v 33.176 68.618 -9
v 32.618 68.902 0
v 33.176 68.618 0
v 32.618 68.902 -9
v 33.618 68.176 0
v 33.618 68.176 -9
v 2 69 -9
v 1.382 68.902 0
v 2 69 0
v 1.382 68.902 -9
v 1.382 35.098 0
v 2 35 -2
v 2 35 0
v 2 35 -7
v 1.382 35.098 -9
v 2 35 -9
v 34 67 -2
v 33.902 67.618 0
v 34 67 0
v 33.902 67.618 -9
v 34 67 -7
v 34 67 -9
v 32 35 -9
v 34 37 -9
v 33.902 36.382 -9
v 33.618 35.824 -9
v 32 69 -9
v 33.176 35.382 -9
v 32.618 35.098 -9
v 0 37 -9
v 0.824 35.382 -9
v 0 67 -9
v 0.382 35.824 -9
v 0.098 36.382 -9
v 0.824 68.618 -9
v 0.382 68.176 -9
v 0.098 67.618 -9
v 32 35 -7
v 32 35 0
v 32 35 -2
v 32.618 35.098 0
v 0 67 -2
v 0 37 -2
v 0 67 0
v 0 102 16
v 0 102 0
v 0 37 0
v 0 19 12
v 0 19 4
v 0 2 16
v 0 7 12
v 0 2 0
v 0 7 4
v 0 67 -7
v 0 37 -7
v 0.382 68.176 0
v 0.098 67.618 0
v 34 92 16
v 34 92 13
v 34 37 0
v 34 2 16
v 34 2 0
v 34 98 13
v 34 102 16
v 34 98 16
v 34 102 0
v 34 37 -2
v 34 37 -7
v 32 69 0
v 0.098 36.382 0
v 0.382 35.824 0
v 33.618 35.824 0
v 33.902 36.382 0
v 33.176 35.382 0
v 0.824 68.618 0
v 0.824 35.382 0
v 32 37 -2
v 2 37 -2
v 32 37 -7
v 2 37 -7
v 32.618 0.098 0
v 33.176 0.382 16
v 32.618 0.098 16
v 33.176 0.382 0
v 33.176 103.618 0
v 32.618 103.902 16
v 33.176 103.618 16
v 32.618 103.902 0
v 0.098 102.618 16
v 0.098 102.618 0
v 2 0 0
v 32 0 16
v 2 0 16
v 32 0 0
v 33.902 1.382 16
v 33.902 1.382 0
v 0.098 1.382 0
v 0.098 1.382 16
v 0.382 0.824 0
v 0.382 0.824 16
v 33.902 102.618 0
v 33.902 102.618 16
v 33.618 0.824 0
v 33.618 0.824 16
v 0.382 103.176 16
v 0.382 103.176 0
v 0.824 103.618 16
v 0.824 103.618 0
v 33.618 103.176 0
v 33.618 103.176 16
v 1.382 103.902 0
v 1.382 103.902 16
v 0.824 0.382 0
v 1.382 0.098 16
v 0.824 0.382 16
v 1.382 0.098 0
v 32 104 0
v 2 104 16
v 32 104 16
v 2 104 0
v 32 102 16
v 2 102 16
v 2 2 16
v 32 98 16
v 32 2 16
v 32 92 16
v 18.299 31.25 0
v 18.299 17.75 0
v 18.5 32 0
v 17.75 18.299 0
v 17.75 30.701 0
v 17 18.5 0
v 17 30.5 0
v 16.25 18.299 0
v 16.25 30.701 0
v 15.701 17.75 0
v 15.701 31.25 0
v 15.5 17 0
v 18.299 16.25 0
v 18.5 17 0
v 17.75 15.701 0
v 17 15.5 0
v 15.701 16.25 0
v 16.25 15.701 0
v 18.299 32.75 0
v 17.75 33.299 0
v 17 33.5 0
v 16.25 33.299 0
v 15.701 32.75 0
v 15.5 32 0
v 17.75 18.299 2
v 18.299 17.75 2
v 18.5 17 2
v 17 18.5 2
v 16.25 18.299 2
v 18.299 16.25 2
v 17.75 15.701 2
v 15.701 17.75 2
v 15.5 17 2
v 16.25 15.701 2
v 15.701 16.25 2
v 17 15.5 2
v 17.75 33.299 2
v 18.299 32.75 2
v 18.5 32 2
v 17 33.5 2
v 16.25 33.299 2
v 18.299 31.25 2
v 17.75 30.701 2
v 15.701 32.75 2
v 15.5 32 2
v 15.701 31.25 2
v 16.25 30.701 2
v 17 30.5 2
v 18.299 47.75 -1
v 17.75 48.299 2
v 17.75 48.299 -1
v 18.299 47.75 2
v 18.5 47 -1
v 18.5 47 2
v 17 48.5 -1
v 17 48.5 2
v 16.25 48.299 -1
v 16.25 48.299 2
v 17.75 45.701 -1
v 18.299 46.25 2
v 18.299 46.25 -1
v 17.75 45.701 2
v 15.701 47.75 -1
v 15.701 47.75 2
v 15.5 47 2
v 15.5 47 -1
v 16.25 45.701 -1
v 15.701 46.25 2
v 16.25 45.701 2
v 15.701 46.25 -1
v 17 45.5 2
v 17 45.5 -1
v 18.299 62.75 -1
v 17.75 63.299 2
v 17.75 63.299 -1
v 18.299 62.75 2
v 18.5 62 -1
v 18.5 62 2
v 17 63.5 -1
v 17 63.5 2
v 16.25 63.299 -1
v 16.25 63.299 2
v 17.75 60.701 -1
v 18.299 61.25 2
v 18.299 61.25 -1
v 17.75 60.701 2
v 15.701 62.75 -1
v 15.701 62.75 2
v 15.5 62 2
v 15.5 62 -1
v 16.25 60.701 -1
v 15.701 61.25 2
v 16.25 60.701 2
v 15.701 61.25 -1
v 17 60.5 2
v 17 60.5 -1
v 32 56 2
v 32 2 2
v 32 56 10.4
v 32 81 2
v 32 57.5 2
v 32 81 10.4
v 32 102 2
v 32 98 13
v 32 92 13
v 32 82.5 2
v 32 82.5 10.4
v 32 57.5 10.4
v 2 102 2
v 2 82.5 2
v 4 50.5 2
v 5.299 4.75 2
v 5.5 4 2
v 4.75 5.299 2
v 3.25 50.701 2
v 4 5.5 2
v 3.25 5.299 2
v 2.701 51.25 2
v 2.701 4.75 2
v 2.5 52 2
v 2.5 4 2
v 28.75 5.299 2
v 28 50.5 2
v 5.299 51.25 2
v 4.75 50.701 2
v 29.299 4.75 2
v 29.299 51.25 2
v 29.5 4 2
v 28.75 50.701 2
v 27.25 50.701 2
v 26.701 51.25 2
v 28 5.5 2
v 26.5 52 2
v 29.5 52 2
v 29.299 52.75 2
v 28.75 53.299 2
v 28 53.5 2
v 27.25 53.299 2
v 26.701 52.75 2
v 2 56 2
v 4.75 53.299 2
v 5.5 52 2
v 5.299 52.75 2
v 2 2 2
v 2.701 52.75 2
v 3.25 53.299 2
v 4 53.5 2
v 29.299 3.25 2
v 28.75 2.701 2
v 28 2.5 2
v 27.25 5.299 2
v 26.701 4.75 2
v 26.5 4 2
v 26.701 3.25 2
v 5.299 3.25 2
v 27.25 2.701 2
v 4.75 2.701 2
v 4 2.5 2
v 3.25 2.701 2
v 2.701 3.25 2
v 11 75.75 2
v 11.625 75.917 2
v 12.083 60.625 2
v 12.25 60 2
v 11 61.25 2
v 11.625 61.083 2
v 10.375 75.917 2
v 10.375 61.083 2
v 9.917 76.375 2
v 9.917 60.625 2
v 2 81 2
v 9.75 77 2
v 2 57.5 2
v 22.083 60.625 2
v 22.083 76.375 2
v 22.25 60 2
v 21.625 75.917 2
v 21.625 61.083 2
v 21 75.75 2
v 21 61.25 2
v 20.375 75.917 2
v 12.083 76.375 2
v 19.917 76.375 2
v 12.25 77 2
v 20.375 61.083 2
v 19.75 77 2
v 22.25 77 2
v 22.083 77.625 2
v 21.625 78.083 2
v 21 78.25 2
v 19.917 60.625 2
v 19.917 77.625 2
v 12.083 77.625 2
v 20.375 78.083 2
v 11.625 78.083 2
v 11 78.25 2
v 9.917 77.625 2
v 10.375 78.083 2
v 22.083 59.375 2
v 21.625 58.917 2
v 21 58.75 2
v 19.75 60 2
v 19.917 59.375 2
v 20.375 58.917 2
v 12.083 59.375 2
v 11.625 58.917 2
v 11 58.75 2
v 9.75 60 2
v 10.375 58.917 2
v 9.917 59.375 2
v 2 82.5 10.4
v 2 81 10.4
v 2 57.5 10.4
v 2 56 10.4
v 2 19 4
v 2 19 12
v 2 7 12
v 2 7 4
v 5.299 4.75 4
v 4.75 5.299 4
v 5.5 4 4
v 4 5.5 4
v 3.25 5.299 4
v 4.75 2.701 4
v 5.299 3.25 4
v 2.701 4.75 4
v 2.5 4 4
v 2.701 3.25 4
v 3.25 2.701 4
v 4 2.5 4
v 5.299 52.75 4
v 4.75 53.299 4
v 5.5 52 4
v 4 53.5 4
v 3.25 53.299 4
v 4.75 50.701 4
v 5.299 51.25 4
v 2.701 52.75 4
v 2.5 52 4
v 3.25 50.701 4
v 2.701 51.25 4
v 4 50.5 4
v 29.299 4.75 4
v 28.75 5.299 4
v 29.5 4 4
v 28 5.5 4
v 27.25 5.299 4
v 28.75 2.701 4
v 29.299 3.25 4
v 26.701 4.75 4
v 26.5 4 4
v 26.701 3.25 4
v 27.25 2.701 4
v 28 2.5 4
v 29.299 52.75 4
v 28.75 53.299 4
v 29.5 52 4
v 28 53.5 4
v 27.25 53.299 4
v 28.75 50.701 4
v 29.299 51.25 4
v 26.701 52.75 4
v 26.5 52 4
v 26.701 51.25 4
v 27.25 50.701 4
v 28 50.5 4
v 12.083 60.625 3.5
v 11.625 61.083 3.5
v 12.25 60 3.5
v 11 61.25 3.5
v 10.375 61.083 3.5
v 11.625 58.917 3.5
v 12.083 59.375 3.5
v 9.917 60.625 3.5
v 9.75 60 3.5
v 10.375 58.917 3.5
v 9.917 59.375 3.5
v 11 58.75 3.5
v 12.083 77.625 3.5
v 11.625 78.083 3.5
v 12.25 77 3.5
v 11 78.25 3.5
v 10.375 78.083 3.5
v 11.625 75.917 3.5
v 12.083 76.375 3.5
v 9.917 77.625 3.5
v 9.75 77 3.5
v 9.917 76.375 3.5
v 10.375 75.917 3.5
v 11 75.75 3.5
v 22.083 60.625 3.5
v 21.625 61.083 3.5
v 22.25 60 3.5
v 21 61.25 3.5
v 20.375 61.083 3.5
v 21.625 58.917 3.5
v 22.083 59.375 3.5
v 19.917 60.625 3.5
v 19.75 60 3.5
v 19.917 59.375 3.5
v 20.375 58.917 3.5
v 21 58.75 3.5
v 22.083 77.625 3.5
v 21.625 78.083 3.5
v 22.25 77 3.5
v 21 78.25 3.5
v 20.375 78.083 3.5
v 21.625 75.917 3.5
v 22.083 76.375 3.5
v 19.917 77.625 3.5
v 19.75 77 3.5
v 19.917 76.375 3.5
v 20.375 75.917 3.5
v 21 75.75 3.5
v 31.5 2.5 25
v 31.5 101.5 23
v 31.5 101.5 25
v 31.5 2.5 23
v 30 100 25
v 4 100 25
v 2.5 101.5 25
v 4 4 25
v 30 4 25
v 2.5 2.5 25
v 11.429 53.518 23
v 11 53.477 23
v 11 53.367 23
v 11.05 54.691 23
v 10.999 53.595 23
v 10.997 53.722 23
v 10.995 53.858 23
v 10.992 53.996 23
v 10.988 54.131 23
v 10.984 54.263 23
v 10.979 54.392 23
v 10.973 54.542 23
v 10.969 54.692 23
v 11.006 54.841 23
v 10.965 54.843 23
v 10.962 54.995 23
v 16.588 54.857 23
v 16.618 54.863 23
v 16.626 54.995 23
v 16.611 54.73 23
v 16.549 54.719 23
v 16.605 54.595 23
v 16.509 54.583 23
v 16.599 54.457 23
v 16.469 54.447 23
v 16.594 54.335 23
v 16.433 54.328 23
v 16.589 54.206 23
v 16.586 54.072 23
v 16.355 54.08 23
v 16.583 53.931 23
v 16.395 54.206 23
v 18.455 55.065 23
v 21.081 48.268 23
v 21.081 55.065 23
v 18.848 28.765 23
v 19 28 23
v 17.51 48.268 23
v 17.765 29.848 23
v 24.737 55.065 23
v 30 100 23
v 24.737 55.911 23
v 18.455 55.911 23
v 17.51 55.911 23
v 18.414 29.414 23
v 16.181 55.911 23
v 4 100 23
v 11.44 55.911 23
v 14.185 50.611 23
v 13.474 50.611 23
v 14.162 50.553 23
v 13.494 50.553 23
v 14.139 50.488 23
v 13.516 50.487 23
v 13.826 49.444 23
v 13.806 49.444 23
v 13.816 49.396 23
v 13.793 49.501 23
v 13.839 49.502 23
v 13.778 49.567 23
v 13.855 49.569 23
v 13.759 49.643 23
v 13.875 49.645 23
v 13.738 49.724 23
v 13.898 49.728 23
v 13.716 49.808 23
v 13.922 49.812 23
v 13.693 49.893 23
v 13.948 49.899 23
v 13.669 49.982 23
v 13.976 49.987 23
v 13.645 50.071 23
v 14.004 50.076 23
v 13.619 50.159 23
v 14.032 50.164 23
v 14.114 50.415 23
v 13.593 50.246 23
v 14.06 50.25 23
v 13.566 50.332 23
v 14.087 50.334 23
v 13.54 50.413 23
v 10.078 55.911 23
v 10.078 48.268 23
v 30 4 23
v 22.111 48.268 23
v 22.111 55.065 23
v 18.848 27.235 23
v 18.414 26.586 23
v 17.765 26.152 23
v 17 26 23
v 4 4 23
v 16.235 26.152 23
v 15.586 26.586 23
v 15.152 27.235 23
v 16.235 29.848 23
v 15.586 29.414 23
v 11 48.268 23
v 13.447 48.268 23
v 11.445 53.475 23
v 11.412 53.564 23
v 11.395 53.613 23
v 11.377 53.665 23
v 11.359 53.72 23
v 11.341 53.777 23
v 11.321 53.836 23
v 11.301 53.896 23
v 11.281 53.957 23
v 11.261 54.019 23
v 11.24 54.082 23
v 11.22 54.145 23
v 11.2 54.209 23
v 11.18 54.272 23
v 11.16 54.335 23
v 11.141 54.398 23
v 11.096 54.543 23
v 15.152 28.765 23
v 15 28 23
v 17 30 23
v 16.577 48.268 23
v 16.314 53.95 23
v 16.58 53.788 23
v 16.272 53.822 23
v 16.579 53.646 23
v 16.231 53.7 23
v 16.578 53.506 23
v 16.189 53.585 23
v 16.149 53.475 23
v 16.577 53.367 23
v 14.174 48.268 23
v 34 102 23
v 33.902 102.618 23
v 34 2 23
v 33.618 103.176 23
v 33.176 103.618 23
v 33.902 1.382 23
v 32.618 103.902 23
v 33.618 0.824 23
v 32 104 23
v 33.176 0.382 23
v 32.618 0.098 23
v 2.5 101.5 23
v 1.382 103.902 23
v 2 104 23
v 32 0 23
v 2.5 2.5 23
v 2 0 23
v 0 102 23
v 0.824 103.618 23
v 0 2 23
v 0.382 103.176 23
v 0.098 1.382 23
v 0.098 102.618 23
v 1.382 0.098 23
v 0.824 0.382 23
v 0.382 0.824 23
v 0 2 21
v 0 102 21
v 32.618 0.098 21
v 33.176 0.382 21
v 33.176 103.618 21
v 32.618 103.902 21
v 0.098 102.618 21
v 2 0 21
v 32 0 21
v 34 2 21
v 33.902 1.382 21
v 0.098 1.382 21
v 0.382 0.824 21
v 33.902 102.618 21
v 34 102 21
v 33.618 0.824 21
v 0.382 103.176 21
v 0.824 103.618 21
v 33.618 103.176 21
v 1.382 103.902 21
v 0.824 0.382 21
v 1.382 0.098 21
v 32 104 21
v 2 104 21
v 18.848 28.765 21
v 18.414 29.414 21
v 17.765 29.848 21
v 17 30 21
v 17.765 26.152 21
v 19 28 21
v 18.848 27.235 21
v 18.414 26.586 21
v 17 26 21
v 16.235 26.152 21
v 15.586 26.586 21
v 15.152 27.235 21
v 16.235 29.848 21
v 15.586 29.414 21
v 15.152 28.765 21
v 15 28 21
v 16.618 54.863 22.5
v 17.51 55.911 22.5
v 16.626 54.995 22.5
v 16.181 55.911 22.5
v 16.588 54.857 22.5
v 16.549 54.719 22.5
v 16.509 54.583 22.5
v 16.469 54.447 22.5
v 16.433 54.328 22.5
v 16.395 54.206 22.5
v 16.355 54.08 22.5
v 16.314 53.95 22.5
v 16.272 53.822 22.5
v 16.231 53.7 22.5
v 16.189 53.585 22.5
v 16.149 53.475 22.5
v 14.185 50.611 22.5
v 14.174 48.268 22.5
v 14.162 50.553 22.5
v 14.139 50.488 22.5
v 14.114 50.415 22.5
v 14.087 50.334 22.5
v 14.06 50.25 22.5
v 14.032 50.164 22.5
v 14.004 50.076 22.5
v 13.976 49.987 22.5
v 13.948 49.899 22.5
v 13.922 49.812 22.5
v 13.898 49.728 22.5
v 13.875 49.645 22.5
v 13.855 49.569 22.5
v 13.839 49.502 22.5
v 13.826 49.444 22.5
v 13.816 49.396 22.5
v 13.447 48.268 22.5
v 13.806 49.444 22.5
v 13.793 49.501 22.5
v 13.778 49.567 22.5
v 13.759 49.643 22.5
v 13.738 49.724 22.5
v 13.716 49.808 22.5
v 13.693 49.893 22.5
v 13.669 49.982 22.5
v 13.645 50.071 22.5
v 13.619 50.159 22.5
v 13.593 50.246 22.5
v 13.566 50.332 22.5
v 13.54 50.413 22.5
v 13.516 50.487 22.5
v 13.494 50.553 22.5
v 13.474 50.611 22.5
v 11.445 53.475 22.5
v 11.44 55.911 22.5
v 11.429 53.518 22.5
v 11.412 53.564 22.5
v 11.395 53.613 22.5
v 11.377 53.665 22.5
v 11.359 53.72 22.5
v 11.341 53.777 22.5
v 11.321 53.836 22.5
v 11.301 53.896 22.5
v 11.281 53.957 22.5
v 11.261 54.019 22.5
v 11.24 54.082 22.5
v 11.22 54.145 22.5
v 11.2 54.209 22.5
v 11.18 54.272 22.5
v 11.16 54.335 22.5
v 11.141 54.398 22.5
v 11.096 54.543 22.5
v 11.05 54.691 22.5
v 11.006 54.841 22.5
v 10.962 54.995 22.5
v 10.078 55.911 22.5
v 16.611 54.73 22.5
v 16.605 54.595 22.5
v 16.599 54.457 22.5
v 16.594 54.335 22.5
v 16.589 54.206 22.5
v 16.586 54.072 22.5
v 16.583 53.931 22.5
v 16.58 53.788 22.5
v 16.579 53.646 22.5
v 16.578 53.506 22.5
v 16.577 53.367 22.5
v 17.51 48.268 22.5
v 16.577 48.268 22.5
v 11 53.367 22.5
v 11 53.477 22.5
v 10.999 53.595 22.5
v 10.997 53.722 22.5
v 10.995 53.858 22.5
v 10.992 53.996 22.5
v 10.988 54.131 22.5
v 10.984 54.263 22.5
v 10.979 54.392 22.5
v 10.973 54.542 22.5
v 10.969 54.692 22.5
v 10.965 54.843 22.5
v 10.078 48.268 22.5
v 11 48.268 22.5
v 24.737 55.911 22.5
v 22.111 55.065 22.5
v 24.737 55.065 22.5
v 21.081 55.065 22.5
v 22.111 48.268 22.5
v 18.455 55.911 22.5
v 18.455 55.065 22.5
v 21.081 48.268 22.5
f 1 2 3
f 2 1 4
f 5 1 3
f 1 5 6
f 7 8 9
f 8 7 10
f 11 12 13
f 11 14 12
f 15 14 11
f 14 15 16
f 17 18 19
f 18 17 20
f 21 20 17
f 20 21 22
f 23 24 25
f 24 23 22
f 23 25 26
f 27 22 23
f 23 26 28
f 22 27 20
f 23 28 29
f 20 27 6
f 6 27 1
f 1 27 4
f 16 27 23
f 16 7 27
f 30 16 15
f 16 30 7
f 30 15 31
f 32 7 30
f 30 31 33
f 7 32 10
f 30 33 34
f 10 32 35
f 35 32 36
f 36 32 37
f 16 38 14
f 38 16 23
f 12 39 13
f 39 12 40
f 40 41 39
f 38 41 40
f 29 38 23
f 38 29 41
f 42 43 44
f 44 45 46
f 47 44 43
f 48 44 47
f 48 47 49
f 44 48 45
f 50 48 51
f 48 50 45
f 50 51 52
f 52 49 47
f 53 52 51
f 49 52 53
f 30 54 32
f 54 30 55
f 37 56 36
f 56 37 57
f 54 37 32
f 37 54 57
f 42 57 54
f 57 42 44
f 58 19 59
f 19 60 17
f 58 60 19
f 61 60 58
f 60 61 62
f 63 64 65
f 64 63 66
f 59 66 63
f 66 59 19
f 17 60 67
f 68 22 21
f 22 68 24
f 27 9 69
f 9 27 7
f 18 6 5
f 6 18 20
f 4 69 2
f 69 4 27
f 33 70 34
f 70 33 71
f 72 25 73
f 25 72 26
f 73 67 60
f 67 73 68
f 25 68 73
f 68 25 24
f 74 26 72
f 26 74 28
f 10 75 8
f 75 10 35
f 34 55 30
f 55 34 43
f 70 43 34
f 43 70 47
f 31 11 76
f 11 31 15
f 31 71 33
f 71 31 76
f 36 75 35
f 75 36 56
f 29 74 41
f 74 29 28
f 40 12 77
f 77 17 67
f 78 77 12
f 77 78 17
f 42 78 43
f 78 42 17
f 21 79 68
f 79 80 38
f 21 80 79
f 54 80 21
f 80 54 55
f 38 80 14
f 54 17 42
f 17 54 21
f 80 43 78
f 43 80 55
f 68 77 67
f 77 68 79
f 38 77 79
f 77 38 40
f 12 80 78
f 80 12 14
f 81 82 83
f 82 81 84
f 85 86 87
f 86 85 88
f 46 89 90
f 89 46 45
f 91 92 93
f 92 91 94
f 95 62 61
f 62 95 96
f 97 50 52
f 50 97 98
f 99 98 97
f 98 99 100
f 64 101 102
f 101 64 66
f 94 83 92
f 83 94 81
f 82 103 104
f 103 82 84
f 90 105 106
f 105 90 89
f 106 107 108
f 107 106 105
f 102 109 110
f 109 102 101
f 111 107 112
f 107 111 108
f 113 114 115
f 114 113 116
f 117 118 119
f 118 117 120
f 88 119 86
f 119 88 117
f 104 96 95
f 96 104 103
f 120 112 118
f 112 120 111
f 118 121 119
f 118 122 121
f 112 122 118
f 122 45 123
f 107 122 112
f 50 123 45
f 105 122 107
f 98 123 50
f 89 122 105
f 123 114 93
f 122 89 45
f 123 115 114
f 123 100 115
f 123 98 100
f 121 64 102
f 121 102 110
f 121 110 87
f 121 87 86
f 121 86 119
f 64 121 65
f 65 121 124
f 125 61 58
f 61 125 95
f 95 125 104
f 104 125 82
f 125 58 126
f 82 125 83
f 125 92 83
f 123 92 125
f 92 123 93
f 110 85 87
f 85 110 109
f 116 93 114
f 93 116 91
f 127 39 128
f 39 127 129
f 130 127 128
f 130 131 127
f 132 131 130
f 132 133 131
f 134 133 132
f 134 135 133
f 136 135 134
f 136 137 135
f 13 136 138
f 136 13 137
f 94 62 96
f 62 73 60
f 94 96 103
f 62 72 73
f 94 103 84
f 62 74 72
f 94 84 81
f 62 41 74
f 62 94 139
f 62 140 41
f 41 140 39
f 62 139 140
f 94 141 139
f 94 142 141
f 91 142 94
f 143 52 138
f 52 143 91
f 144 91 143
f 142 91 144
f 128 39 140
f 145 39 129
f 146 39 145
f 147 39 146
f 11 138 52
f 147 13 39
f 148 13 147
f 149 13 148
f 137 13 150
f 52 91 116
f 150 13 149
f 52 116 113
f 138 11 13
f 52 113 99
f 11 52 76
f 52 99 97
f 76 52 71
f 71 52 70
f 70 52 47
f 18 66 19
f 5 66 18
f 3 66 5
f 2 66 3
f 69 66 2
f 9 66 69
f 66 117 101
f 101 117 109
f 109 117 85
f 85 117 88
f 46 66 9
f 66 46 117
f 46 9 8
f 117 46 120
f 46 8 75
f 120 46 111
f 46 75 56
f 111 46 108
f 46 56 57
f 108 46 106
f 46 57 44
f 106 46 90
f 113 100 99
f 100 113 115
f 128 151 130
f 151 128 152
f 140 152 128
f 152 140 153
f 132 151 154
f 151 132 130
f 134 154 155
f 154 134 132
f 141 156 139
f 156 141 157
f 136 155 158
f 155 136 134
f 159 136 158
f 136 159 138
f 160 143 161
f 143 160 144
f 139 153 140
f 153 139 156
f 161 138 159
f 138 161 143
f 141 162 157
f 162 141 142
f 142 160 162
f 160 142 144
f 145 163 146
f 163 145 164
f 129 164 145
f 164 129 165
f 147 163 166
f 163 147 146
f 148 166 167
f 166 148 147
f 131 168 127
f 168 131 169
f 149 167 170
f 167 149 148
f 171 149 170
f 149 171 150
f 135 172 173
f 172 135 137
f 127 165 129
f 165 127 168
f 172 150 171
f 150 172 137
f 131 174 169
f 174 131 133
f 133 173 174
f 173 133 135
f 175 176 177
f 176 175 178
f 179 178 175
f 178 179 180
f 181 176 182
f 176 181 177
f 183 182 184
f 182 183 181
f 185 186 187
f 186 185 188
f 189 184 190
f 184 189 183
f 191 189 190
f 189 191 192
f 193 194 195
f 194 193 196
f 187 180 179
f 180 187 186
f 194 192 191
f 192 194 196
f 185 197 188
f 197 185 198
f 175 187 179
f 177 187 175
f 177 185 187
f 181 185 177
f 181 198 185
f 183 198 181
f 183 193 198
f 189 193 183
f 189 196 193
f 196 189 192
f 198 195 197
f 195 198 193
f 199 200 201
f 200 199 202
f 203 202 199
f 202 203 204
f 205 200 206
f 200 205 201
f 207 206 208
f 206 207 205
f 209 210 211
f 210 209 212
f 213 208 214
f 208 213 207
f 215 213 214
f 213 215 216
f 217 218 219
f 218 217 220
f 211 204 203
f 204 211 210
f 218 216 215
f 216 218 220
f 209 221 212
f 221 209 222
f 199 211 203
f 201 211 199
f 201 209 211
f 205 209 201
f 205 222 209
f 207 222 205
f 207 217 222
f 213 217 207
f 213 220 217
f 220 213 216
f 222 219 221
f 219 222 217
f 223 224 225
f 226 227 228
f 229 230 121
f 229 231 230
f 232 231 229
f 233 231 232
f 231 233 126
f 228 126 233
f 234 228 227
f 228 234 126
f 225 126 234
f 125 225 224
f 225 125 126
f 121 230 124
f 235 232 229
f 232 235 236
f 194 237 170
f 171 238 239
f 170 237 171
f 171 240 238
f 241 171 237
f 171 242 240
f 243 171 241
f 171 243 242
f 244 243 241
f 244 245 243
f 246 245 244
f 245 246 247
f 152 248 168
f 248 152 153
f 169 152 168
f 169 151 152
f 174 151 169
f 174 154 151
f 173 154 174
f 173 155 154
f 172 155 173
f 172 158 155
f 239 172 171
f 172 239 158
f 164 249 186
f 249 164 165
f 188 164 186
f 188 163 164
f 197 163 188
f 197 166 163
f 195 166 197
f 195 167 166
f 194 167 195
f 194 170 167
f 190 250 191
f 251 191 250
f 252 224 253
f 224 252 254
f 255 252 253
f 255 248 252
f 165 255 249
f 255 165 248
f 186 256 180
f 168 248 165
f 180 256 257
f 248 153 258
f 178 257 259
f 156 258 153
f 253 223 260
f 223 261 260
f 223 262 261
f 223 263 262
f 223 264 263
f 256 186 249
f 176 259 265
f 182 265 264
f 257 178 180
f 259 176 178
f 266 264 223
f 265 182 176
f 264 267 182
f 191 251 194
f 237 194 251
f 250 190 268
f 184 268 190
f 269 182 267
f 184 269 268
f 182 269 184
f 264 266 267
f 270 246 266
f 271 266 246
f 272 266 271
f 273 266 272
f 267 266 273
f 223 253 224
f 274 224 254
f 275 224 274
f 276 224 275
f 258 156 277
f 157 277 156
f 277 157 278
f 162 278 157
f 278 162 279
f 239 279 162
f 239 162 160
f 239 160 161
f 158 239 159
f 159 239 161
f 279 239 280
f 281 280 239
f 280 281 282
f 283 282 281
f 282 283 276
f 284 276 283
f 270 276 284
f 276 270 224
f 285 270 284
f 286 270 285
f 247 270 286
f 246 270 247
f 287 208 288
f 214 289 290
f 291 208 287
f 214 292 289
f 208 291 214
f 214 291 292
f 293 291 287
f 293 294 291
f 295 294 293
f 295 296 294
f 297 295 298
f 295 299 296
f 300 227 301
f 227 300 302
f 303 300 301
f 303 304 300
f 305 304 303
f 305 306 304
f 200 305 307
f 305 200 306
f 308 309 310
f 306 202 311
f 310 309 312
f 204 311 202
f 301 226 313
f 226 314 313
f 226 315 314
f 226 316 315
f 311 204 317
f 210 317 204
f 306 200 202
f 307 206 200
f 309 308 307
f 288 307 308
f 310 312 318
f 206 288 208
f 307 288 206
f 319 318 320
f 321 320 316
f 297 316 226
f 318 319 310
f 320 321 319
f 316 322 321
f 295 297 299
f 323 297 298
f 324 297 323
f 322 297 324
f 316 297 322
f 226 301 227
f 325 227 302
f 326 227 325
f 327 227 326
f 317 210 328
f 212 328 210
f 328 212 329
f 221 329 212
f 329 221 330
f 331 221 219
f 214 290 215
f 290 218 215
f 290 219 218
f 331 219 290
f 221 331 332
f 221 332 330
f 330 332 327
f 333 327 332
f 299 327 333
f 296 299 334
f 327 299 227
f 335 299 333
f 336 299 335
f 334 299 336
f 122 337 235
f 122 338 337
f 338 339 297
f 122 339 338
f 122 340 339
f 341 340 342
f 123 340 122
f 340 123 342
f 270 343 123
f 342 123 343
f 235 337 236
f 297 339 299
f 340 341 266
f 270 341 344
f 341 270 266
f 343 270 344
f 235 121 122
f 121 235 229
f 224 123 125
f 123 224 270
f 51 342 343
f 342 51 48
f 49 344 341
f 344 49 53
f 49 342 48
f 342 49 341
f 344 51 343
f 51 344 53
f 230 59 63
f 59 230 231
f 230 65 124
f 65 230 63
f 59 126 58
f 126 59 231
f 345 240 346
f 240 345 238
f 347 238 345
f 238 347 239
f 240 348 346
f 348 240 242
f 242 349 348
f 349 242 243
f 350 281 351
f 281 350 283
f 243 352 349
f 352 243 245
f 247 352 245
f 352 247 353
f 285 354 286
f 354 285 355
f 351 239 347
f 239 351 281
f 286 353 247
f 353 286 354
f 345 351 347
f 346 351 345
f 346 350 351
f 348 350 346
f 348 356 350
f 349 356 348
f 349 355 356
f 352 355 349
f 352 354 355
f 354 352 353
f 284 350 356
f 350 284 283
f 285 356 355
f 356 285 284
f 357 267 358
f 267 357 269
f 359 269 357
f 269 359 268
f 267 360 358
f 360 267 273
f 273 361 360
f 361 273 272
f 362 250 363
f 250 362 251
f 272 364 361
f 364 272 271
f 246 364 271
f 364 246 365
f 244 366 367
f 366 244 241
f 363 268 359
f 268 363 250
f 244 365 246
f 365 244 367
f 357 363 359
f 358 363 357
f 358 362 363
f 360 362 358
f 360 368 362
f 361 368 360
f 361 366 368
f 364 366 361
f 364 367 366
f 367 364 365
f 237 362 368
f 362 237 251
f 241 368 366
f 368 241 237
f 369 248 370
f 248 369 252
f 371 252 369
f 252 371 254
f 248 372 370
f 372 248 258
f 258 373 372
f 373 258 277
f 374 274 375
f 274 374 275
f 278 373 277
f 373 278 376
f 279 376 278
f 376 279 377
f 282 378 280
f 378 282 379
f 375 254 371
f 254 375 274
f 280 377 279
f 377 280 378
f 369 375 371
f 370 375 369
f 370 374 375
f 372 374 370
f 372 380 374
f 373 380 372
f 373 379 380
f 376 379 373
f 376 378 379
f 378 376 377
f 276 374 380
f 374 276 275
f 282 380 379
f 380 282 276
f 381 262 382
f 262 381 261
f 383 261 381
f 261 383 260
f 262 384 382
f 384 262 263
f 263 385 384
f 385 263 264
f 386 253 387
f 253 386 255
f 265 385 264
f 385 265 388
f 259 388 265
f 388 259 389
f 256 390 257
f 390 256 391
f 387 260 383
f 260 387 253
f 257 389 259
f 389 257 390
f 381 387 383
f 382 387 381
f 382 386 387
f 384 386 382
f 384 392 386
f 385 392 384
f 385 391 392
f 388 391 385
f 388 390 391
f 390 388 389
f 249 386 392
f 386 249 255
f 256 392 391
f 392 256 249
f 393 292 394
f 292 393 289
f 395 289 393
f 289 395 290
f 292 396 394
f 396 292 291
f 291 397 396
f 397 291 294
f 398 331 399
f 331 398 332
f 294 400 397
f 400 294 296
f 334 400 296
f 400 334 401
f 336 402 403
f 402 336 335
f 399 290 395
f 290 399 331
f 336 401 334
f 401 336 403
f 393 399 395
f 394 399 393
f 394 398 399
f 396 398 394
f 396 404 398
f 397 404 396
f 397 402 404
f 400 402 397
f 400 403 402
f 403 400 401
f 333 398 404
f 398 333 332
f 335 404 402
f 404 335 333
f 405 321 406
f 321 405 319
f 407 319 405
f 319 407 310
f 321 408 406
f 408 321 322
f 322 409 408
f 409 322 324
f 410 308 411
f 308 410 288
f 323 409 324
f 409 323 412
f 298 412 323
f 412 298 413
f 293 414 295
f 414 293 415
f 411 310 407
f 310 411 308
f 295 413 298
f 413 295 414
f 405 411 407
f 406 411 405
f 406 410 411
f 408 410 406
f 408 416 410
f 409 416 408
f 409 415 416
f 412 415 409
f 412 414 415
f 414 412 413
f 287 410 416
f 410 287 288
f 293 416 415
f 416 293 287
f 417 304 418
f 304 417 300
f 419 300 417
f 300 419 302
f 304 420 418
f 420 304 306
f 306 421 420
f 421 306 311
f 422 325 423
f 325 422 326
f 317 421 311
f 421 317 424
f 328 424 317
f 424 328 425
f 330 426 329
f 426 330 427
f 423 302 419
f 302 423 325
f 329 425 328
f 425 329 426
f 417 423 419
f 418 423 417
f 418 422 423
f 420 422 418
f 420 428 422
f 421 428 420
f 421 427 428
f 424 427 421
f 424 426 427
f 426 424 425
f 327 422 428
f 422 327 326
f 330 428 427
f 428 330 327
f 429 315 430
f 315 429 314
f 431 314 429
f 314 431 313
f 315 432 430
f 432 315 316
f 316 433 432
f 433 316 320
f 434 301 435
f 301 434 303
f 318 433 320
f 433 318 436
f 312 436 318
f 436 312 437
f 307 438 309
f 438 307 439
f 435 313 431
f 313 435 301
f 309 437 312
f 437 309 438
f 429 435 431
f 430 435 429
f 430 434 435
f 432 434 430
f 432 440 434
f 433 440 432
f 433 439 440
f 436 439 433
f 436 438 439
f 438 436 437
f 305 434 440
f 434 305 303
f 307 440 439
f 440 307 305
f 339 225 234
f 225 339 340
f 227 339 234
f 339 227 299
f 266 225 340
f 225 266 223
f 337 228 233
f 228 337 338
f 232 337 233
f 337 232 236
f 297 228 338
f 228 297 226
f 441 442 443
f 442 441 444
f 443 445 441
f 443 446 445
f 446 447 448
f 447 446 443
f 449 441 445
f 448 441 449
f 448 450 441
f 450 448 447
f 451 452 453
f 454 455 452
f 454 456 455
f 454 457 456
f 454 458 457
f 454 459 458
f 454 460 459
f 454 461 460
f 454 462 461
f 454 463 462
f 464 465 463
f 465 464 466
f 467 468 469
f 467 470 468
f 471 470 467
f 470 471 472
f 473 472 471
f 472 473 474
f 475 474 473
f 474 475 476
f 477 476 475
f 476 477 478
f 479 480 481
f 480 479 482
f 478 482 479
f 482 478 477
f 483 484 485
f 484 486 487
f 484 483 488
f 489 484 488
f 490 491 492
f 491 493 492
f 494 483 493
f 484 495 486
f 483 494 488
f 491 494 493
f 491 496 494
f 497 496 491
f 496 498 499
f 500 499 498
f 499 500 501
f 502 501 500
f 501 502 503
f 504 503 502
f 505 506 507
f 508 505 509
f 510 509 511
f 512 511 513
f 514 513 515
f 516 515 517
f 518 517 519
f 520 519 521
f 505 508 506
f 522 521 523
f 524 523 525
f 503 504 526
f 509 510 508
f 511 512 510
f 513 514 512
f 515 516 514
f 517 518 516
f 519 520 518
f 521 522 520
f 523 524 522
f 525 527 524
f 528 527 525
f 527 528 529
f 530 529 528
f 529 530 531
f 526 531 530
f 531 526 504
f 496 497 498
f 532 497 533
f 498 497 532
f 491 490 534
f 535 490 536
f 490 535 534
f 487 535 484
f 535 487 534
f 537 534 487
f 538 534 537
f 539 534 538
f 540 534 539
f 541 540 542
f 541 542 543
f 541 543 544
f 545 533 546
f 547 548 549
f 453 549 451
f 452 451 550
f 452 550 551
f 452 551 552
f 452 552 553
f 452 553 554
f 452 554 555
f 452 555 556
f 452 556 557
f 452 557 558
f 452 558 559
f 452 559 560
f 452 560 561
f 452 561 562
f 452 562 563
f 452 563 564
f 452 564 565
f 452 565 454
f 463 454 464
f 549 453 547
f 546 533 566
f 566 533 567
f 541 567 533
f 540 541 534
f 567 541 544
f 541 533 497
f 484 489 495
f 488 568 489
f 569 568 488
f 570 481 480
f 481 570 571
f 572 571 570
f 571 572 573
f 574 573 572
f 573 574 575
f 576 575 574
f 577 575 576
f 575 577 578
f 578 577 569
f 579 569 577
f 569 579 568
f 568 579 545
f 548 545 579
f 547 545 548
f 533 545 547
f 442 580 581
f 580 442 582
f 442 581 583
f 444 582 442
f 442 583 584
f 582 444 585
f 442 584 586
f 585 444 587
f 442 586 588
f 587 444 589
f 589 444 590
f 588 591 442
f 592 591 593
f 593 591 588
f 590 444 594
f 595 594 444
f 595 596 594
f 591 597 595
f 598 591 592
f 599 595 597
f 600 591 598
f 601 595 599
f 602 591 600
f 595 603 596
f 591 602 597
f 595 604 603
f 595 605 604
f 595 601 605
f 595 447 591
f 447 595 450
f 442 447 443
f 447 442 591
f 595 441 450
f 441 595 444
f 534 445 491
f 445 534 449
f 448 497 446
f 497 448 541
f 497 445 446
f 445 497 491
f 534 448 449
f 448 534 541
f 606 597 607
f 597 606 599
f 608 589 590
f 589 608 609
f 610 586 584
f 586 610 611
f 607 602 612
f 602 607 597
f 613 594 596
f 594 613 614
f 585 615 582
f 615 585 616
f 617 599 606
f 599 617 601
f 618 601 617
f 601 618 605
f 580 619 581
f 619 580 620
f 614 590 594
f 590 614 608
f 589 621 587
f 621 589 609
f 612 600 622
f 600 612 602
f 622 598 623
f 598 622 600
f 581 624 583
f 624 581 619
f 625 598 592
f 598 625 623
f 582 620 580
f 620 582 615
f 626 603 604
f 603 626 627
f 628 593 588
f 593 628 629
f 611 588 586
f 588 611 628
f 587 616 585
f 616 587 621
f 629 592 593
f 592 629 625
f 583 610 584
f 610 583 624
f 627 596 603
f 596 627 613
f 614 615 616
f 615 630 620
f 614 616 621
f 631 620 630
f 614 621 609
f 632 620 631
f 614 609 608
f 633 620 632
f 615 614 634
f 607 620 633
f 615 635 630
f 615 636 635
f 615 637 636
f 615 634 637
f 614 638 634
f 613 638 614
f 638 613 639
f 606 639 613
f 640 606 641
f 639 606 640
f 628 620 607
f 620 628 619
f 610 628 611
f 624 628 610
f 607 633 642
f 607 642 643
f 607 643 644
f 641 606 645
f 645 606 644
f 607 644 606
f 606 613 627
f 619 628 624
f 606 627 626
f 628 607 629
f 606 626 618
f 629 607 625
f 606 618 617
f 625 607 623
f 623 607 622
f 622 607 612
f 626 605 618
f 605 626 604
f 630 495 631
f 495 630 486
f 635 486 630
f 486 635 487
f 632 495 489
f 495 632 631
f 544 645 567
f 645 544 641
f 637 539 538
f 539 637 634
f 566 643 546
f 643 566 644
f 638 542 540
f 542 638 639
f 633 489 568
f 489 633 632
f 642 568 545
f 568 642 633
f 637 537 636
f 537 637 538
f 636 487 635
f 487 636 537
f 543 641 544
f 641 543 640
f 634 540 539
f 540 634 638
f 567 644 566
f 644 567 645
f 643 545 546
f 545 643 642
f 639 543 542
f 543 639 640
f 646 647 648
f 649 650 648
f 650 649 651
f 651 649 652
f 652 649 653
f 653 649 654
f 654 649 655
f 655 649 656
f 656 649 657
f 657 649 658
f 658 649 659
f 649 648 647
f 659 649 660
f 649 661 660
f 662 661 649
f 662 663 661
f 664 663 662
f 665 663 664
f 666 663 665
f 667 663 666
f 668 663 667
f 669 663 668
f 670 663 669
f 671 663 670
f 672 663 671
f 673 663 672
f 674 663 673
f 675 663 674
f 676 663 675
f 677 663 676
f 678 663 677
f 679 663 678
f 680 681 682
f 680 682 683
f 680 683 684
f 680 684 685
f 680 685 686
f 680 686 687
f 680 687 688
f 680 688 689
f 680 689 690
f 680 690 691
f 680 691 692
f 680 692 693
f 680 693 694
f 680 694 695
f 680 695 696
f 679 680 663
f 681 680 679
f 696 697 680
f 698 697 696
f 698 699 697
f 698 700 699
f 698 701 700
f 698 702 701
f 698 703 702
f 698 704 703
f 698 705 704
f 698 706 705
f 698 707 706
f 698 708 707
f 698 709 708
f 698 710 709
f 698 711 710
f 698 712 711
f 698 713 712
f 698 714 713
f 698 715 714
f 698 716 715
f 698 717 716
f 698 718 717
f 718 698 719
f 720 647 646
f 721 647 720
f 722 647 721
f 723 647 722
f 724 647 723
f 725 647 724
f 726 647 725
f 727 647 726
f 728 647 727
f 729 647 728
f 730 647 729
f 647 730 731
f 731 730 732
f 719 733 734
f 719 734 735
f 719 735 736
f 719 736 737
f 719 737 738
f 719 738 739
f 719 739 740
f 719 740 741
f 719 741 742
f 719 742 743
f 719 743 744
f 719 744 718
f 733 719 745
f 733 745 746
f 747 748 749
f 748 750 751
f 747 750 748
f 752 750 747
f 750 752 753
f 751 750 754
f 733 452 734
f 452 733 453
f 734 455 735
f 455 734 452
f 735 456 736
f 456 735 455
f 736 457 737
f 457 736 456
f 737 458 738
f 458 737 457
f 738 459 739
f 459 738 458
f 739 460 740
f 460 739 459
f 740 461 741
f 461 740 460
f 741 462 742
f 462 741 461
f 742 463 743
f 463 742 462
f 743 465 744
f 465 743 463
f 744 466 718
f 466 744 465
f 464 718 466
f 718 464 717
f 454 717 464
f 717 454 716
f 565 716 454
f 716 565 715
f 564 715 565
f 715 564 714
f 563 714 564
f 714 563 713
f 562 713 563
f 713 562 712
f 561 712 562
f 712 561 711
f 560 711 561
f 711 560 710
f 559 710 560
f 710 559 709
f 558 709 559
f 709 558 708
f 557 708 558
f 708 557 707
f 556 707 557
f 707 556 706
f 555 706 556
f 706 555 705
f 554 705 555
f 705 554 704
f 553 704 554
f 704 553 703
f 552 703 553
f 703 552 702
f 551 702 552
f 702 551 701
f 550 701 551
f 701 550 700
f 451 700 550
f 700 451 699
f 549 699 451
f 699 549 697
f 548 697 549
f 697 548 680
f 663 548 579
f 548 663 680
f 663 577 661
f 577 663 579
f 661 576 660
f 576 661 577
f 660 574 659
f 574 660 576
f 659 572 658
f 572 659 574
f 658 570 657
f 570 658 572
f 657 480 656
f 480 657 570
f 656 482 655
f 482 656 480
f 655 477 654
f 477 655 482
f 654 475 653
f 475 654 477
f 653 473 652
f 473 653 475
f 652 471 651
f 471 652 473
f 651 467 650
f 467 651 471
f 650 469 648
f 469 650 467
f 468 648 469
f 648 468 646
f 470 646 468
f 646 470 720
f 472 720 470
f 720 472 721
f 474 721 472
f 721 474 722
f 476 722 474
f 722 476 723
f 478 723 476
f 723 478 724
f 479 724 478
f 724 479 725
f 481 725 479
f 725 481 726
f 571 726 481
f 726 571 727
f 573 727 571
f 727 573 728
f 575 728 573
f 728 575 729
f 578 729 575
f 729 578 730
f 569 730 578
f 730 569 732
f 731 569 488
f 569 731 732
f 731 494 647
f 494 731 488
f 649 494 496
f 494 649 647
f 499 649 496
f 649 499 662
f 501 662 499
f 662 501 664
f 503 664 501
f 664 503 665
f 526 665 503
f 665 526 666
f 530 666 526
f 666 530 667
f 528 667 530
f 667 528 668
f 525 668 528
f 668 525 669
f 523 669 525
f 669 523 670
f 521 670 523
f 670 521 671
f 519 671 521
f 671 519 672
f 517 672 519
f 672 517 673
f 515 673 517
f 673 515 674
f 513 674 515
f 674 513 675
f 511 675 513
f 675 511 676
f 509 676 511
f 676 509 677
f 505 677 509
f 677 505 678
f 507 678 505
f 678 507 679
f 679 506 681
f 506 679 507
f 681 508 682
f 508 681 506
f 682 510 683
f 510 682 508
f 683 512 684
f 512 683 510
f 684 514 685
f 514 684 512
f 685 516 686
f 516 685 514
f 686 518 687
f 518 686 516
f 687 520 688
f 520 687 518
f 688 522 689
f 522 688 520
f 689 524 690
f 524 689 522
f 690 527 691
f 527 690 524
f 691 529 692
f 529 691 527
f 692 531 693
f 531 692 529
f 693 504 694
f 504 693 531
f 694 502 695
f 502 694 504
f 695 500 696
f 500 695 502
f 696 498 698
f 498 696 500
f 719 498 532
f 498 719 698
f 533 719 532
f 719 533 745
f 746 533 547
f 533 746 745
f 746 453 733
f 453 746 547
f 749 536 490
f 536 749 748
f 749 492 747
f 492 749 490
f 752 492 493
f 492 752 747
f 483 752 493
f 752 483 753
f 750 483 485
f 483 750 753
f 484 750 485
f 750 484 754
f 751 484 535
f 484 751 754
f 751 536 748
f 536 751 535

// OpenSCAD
// ==========================================
// Motion Trainer - Headphone Strap Enclosure
// ==========================================
// Mounts to headphone headband, holds:
// - ESP32 Dev Board (TYPE-C CH340C)
// - MPU6050 (GY-521)
// - 433MHz TX module
// 
// Power via external USB cable to powerbank
// ==========================================

// === PARAMETERS - ADJUST TO FIT YOUR HEADPHONES ===

// Headphone headband dimensions (measure yours!)
headband_width = 30;      // Width of headband (mm)
headband_thickness = 4;   // Thickness of headband (mm)
headband_curve = 150;     // Approximate curve radius (mm), 0 for flat

// Clip grip
clip_grip = 2;            // How much clip overlaps headband (mm)
clip_clearance = 0.5;     // Extra space for fit (mm)

// Wall thickness
wall = 2;

// === COMPONENT DIMENSIONS ===

// ESP32 Dev Board (TYPE-C CH340C) - MEASURE YOURS!
esp_w = 28;               // Width (mm)
esp_l = 52;               // Length (mm)  
esp_h = 12;               // Height with pins (mm)

// MPU6050 GY-521
mpu_w = 16;
mpu_l = 21;
mpu_h = 4;

// 433MHz TX (FS1000A)
tx_w = 19;
tx_l = 19;
tx_h = 6;

// === CALCULATED DIMENSIONS ===

// Internal cavity
cavity_w = esp_w + 2;
cavity_l = esp_l + mpu_l + tx_l + 8;  // All in a row with gaps
cavity_h = max(esp_h, max(mpu_h, tx_h)) + 2;

// Outer dimensions
outer_w = cavity_w + wall * 2;
outer_l = cavity_l + wall * 2;
outer_h = cavity_h + wall;

// Clip dimensions  
clip_h = headband_thickness + clip_clearance * 2;
clip_total_h = clip_h + wall * 2;

// === MODULES ===

module rounded_box(w, l, h, r=2) {
    hull() {
        for (x = [r, w-r]) {
            for (y = [r, l-r]) {
                translate([x, y, 0])
                    cylinder(h=h, r=r, $fn=20);
            }
        }
    }
}

module component_slot(w, l, h, label="") {
    difference() {
        cube([w + 1, l + 1, h + 0.1]);
        // Corner relief for easier insertion
        translate([-0.5, -0.5, 0])
            cube([1, 1, h + 0.1]);
        translate([w + 0.5, -0.5, 0])
            cube([1, 1, h + 0.1]);
    }
}

module base() {
    difference() {
        union() {
            // Main body
            rounded_box(outer_w, outer_l, outer_h);
            
            // Headband clip - wraps around headband
            translate([0, outer_l/2 - headband_width/2 - wall, -clip_total_h])
                difference() {
                    // Outer clip shell
                    rounded_box(outer_w, headband_width + wall*2, clip_total_h + wall, r=2);
                    
                    // Headband channel
                    translate([wall - clip_grip, wall, wall])
                        cube([outer_w - wall*2 + clip_grip*2, 
                              headband_width, 
                              headband_thickness + clip_clearance*2]);
                    
                    // Entry slot (open on one side for sliding onto headband)
                    translate([outer_w/2 - headband_width/2, -1, wall])
                        cube([headband_width, wall + 2, clip_h]);
                }
        }
        
        // Main cavity
        translate([wall, wall, wall])
            cube([cavity_w, cavity_l, cavity_h + 1]);
        
        // USB port opening (side)
        translate([-1, wall + 5, wall + 2])
            cube([wall + 2, 12, 8]);
        
        // Antenna wire exit (top/side)
        translate([outer_w - wall - 1, wall + cavity_l - 10, wall + cavity_h - 3])
            cube([wall + 2, 6, 5]);
        
        // Ventilation holes
        for (i = [0:3]) {
            translate([outer_w/2, wall + 15 + i*15, -1])
                cylinder(d=3, h=wall+2, $fn=12);
        }
    }
    
    // Component dividers/holders inside
    translate([wall, wall, wall]) {
        // ESP32 board area
        // Corner posts to hold board
        post_h = 2;
        for (x = [2, cavity_w - 4]) {
            for (y = [2, esp_l - 2]) {
                translate([x, y, 0])
                    cylinder(d=3, h=post_h, $fn=12);
            }
        }
        
        // Divider after ESP32
        translate([0, esp_l + 2, 0])
            cube([cavity_w, 1.5, cavity_h * 0.6]);
        
        // MPU6050 area - centered, with posts
        mpu_offset_y = esp_l + 4;
        mpu_offset_x = (cavity_w - mpu_w) / 2;
        for (x = [mpu_offset_x + 2, mpu_offset_x + mpu_w - 4]) {
            for (y = [mpu_offset_y + 2, mpu_offset_y + mpu_l - 2]) {
                translate([x, y, 0])
                    cylinder(d=2.5, h=1.5, $fn=12);
            }
        }
        
        // Divider after MPU
        translate([0, esp_l + mpu_l + 6, 0])
            cube([cavity_w, 1.5, cavity_h * 0.6]);
        
        // TX module area - remaining space
    }
}

module lid() {
    difference() {
        union() {
            // Main lid
            rounded_box(outer_w, outer_l, wall);
            
            // Inner lip to hold lid in place
            translate([wall + 0.5, wall + 0.5, wall])
                difference() {
                    cube([cavity_w - 1, cavity_l - 1, 2]);
                    translate([1.5, 1.5, -0.1])
                        cube([cavity_w - 4, cavity_l - 4, 2.2]);
                }
        }
        
        // Status LED window (for ESP32 built-in LED)
        translate([outer_w/2, wall + esp_l/2, -0.1])
            cylinder(d=4, h=wall + 0.2, $fn=16);
        
        // Label engraving
        translate([outer_w/2, outer_l/2, wall - 0.5])
            linear_extrude(0.6)
                text("MT", size=8, halign="center", valign="center");
    }
}

// === RENDER ===

// Uncomment the part you want to export:

// Main enclosure base
base();

// Lid (positioned for printing)
// translate([outer_w + 10, 0, 0]) lid();

// Both parts for preview
 translate([0, 0, outer_h + 5]) lid();

// === PRINT SETTINGS ===
// Layer height: 0.2mm
// Infill: 15-20%
// Supports: Yes, for the clip overhang
// Material: PLA or PETG
